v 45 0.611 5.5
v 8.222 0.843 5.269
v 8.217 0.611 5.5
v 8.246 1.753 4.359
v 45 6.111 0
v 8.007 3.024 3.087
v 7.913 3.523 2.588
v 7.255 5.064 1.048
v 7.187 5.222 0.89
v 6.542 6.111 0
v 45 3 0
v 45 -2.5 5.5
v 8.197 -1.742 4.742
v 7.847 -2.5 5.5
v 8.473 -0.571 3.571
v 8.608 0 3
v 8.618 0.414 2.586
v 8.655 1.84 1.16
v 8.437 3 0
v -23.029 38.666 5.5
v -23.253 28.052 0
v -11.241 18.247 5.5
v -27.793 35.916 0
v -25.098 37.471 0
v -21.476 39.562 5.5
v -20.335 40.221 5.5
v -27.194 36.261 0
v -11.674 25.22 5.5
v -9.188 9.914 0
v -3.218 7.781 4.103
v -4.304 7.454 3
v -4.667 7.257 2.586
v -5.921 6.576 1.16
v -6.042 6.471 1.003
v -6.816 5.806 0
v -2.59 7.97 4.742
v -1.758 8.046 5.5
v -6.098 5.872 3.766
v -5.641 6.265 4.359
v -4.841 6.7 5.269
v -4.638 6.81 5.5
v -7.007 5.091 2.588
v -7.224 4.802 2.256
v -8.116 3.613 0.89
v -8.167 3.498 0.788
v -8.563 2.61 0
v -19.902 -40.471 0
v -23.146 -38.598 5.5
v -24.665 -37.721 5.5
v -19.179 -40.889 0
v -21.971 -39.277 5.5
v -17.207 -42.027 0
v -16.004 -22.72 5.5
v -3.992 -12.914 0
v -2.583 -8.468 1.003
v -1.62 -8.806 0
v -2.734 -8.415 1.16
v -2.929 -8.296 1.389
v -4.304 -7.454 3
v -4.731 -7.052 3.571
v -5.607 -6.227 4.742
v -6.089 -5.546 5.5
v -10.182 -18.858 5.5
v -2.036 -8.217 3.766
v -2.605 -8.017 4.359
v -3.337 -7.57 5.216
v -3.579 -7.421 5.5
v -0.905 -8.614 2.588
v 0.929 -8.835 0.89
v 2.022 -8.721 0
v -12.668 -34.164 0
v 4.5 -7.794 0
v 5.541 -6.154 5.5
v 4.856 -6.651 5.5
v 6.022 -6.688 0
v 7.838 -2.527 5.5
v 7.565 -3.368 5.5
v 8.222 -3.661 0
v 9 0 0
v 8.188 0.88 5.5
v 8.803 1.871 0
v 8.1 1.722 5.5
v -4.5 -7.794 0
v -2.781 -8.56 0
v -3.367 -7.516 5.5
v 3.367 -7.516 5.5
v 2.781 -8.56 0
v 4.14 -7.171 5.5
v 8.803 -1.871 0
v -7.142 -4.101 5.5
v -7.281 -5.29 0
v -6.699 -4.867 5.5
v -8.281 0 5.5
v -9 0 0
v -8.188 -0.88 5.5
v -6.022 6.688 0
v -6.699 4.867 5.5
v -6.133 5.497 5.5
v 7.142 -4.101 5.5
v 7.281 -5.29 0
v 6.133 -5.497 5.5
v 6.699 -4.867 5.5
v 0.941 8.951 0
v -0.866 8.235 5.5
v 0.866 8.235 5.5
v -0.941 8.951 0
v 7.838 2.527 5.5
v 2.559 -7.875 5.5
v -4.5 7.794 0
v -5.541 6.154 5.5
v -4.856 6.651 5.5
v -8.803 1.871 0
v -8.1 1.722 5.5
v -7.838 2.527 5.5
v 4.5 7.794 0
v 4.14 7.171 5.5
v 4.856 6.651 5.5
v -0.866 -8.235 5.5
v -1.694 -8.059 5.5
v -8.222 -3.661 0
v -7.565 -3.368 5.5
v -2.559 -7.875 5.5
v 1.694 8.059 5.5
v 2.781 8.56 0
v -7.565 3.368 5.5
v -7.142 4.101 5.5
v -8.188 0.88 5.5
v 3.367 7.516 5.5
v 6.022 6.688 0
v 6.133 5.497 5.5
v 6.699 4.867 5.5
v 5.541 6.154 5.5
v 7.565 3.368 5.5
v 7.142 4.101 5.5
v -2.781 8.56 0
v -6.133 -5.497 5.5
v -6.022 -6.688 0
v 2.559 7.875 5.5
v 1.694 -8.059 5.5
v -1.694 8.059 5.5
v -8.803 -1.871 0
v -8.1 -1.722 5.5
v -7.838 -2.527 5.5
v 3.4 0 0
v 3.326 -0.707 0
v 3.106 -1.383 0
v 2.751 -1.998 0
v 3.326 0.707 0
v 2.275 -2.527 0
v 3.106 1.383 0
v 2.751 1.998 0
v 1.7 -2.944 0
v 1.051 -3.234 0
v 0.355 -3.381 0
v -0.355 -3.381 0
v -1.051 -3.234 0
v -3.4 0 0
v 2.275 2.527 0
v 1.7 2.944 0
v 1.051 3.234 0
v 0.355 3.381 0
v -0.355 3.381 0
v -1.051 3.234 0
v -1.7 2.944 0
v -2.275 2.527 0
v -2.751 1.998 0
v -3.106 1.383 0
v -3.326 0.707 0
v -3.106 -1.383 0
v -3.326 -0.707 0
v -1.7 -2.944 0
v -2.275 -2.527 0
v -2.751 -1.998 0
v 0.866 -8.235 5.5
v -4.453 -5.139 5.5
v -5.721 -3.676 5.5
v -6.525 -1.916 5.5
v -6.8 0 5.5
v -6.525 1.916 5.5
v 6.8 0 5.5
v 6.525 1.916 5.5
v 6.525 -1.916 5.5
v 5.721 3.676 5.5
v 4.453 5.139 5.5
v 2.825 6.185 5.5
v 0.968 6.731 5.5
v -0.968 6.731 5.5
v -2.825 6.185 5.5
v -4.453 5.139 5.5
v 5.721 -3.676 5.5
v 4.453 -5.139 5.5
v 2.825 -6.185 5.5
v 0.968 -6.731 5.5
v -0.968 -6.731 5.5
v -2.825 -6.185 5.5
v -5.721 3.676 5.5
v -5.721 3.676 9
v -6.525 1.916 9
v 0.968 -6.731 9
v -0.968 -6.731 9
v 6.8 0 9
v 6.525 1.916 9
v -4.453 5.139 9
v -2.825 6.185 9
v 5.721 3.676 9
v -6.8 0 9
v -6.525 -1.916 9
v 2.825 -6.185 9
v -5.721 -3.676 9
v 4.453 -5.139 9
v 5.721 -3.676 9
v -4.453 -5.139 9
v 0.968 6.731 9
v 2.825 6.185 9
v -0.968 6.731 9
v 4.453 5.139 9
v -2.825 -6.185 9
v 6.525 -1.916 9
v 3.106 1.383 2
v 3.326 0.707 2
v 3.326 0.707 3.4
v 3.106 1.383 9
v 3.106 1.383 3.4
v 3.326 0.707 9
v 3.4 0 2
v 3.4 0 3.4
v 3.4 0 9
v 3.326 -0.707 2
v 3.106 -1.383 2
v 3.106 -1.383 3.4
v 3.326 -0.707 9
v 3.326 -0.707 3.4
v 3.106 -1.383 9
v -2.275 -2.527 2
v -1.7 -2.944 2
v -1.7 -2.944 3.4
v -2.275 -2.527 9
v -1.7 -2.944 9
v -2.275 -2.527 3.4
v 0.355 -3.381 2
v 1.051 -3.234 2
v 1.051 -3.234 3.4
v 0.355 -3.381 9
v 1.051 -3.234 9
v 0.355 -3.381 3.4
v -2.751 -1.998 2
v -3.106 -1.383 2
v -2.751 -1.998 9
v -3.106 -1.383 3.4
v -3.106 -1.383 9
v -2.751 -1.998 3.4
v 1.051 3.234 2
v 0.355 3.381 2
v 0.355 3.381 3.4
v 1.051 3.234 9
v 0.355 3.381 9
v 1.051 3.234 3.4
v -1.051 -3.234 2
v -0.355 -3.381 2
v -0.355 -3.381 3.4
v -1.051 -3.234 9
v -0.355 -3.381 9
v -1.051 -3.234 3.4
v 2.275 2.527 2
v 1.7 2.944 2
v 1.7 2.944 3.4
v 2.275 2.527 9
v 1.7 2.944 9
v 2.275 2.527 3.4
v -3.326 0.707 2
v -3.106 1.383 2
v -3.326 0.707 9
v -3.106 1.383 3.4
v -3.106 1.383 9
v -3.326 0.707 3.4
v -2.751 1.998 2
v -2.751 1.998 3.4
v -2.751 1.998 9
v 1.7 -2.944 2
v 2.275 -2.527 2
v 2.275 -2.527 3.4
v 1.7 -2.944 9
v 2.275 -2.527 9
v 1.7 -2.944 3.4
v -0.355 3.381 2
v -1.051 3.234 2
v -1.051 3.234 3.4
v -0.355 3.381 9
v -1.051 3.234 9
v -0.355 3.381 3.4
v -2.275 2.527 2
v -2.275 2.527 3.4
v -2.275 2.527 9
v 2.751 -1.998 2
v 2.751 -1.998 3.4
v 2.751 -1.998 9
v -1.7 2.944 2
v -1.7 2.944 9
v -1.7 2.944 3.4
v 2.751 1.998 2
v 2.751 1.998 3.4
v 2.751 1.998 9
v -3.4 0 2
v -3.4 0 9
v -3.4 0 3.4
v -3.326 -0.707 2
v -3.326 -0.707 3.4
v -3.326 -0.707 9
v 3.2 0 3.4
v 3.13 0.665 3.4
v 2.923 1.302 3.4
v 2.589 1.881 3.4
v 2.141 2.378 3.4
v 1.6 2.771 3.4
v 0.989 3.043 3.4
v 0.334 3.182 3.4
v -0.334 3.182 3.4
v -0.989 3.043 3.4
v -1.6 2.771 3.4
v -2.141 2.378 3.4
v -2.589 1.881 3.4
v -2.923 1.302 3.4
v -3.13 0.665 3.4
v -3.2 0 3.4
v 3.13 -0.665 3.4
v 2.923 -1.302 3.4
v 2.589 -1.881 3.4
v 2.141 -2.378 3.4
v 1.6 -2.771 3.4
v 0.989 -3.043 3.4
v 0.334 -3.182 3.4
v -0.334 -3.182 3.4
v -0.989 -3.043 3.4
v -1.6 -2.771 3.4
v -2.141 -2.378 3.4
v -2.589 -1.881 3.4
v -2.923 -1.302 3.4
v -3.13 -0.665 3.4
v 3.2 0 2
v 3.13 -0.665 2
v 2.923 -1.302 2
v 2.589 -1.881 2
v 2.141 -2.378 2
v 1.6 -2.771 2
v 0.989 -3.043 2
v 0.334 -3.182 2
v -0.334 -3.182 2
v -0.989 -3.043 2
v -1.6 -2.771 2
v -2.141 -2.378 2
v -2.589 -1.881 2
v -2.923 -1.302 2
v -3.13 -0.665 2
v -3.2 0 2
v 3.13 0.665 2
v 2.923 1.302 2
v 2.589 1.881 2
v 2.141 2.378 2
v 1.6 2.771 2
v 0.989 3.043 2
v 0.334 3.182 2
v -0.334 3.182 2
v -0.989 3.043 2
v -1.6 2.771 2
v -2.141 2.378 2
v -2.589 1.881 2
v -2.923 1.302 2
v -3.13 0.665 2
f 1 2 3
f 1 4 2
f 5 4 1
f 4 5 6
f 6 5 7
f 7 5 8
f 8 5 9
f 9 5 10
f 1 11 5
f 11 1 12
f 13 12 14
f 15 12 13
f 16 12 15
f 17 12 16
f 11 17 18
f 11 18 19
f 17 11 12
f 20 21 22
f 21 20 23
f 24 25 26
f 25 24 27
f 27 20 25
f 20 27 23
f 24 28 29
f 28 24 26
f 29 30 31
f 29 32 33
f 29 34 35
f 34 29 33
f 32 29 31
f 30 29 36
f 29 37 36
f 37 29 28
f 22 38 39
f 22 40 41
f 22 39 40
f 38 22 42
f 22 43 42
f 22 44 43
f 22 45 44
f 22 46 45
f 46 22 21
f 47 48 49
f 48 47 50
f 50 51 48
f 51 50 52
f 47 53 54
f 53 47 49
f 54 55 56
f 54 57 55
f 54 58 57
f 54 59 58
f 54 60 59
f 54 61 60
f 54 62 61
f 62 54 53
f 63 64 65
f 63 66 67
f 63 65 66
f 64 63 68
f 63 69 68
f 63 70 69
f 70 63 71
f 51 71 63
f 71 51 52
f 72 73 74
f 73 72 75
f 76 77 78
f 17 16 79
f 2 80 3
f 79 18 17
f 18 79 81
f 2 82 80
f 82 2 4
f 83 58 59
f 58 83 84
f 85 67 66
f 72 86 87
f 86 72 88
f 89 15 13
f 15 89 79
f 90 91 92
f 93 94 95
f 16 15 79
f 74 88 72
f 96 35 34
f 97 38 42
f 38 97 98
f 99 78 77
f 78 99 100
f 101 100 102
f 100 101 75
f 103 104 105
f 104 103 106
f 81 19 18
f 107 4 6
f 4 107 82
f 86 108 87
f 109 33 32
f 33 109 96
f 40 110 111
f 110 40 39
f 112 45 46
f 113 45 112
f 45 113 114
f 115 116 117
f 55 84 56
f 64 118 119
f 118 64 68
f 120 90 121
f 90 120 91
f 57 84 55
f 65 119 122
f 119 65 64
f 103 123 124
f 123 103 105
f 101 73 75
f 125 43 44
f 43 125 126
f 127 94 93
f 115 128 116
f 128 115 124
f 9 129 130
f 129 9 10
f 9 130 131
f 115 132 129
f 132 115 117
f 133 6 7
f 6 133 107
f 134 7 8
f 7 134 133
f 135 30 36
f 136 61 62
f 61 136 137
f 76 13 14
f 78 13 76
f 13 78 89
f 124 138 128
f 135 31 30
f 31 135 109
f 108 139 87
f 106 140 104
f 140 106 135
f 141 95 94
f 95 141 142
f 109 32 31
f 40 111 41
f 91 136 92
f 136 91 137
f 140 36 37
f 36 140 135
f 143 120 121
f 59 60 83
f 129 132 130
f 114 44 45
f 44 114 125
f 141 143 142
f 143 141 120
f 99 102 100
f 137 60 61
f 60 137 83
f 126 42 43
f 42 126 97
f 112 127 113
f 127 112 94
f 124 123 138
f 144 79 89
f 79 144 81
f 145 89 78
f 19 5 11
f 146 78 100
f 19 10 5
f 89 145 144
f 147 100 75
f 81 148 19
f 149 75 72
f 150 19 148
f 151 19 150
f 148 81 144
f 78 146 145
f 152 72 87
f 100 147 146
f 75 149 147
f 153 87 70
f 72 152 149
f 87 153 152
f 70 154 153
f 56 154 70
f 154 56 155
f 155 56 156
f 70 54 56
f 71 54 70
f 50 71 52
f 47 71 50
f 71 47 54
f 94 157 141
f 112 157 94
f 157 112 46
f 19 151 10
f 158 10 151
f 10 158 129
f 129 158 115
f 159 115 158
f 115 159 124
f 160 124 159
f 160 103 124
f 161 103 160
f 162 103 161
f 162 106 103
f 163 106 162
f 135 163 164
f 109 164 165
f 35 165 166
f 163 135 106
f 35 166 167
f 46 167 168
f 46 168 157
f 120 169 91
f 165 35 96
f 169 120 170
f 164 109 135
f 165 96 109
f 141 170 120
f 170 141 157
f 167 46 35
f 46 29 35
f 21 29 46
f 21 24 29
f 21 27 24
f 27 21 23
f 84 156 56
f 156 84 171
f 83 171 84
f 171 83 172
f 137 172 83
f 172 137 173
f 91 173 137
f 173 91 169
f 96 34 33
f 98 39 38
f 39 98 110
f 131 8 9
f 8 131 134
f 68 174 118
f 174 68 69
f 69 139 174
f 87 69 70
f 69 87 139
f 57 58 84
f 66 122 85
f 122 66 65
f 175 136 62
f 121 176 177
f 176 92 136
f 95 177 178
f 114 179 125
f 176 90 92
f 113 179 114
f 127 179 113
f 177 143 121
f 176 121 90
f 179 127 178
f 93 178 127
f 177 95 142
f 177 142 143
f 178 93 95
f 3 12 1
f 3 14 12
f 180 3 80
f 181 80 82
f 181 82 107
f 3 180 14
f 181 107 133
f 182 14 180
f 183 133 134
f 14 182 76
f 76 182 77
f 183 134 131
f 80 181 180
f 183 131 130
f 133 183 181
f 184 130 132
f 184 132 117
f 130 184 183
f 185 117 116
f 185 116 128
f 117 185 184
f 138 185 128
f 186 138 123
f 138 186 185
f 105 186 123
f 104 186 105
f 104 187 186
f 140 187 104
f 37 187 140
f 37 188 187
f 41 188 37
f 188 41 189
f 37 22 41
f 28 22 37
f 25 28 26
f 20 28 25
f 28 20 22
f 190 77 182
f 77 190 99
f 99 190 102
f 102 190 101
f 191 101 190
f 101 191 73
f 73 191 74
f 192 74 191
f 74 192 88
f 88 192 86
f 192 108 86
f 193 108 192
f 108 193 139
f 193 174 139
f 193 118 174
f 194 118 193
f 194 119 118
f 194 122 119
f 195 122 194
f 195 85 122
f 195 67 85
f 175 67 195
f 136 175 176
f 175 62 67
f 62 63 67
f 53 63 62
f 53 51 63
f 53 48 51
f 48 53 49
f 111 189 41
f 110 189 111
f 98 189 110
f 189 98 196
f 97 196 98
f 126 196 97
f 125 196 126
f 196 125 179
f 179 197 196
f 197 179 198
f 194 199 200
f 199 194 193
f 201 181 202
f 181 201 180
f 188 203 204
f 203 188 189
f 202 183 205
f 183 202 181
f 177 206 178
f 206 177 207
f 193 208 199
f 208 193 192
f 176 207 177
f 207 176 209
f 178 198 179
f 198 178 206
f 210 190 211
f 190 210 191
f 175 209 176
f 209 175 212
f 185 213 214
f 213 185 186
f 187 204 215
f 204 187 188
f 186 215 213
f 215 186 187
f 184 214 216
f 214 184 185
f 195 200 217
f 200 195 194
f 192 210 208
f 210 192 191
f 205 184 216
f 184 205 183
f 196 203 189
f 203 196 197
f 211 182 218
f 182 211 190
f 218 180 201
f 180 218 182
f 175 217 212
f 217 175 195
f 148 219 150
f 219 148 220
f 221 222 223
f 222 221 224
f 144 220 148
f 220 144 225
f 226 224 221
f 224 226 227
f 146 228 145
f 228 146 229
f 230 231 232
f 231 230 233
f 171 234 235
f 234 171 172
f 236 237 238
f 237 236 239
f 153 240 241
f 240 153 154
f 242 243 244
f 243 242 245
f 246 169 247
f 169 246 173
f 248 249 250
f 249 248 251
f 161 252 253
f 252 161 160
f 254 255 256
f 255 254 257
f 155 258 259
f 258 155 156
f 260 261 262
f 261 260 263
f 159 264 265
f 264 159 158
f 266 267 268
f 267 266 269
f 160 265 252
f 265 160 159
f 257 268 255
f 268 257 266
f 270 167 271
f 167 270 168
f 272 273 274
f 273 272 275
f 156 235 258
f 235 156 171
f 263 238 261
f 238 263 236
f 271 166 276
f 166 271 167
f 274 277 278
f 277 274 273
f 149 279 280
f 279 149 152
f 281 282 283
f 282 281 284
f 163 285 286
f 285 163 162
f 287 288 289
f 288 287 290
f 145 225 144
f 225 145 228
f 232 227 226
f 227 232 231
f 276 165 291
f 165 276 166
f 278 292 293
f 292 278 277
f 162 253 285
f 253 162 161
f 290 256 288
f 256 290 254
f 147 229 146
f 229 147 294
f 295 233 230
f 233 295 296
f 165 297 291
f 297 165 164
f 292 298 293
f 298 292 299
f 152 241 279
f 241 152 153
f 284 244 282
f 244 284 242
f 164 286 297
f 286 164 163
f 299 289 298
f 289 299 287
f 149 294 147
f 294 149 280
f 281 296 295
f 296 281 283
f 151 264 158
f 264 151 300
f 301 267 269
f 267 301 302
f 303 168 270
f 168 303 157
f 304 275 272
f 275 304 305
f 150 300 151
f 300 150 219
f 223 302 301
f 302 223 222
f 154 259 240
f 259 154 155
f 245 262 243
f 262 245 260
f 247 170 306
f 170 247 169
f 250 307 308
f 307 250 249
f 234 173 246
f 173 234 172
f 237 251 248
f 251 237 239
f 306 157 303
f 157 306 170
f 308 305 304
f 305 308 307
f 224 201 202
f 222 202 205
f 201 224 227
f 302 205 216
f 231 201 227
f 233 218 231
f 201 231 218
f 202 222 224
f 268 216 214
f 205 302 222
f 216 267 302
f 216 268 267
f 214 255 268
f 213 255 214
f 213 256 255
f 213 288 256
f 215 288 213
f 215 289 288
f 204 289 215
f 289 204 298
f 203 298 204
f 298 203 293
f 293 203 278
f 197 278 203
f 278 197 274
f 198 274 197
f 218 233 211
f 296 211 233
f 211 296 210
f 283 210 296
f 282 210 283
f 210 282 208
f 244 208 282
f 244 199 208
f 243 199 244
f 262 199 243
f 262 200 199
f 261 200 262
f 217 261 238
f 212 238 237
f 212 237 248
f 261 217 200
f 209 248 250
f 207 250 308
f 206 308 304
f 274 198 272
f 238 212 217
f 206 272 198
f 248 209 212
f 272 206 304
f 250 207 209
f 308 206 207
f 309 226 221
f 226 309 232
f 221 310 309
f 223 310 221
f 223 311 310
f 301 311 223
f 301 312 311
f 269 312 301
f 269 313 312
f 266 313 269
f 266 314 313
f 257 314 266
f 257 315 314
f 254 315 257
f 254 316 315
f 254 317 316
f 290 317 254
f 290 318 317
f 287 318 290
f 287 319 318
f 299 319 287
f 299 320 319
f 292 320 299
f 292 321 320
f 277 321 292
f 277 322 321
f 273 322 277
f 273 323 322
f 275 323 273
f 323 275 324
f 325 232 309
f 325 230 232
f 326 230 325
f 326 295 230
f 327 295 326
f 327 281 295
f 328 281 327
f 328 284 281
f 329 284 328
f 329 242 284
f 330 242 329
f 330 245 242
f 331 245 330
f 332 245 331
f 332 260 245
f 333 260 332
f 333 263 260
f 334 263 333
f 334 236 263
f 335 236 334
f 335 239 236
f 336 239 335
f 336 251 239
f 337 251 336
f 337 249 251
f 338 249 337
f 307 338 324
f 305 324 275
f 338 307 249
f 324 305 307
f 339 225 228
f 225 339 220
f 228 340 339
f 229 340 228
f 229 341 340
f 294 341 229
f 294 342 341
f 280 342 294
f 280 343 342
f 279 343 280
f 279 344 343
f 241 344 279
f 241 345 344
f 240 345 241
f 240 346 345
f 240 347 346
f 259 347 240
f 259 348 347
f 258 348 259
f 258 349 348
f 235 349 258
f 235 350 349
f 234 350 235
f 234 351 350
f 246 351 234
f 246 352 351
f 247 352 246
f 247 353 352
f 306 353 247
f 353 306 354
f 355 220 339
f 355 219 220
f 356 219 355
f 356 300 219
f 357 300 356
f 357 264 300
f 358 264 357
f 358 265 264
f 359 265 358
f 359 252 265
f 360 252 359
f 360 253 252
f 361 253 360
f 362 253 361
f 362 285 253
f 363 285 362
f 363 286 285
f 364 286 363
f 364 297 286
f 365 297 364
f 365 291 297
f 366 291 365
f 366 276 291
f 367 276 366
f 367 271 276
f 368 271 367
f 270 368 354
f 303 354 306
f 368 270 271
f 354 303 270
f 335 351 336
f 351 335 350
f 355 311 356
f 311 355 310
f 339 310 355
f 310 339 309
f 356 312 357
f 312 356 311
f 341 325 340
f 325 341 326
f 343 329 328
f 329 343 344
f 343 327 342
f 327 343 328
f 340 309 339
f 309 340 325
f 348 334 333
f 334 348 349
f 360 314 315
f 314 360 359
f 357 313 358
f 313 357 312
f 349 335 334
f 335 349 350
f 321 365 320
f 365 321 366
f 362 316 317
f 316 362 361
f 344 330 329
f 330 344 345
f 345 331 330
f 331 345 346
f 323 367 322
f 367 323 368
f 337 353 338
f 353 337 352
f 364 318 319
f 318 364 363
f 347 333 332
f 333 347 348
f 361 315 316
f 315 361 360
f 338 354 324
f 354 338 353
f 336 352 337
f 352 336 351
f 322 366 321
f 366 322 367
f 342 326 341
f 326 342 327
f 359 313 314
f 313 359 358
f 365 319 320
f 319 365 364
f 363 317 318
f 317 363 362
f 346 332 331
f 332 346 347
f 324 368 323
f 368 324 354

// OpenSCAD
// preview[view:north east, tilt:top diagonal]

// How many blades?
blades = 3; // [1:1:75]

// Length of blades
length = 45; // [1:1:300]

// Depth of propeller
depth = 10; // [1:1:75]

// How thick shall the blades be?
t = 2.2; // [0.1:0.1:7]

// Center hole for the shaft
shaft = 6.8; // [0:0.1:20]

// Do you want one flat side in the shaft hole?
cut = 0; // [1:Yes,0:No]

// Add a nudge
donudge = 1; // [1:Yes,0:No]

// Add nudge at x mm
nudge = 1.4; // [0:0.1:75]

// Cut off the top
docuttop = 1; // [1:Yes,0:No]

// How much to cut off the top
cuttopheight = 4.5;

/* [Hidden] */
angle = 45;

difference() {   
    ///////////////////////
    // Draw these things //
    ///////////////////////
    union(){
        for (rotation =[0:360/blades:360]) {
            rotate([0,0,rotation]) {
                translate([0,8,-5]) {
                    rotate([angle,0,0]) {
                        // Draw blades
                        cube([length, t, depth/sin(angle)+10],false);
                    } // End rotate
                } // End translate       
            } // End rotate
        } // End for spaceW

    if (depth>20) {
        // Draw center cylinder for deep propellers
        cylinder(h=depth, r1=depth/4, r2=depth/3, center=false, $fn=40);
        } else {
        // Draw center cylinder for shallow propellers
        cylinder(h=depth, r1=9, r2=depth/1.3, center=false, $fn=30); 
        } // End else
    } // End union

    ///////////////////////////
    // Cut away these things //
    ///////////////////////////

    // Draw shaft hole
    translate([0,0,-1]) {
        cylinder(h=depth+1, r1=shaft/2, r2=shaft/2, center=false, $fn=30);
    } // End translate

    // Cut away bottom
    translate([0,0,-5]) {
        cube([1000, 1000, 10],true);
    } // End translate

    // Cut away top
    translate([-500,-500,depth-1]) {
        cube([1000, 1000, 10],false);
    } // End translate
    
    if (docuttop==1) {
        translate([0, 0, depth-cuttopheight]) {
            difference() {
                cylinder(h=cuttopheight, r=length+1);
                translate([0, 0, -0.1]) cylinder(h=cuttopheight+0.2, r=shaft);
            }
        }
    }

} // End difference

// Draw extra part in shaft hole if cut is choosen
if (cut==1) {
    translate([shaft/3,-shaft/2,0]) {
        cube([shaft/3, shaft, depth-1],false);
    } // End translate
} // End if cut

// Add nudge inside shaft
translate([0, 0, 2]) {
    difference() {
        cylinder(h=nudge, r=shaft, $fn=30);
        translate([0, 0, -0.1]) cylinder(h=nudge+0.2, r=(shaft/2)-0.2, $fn=30);
    }
}

